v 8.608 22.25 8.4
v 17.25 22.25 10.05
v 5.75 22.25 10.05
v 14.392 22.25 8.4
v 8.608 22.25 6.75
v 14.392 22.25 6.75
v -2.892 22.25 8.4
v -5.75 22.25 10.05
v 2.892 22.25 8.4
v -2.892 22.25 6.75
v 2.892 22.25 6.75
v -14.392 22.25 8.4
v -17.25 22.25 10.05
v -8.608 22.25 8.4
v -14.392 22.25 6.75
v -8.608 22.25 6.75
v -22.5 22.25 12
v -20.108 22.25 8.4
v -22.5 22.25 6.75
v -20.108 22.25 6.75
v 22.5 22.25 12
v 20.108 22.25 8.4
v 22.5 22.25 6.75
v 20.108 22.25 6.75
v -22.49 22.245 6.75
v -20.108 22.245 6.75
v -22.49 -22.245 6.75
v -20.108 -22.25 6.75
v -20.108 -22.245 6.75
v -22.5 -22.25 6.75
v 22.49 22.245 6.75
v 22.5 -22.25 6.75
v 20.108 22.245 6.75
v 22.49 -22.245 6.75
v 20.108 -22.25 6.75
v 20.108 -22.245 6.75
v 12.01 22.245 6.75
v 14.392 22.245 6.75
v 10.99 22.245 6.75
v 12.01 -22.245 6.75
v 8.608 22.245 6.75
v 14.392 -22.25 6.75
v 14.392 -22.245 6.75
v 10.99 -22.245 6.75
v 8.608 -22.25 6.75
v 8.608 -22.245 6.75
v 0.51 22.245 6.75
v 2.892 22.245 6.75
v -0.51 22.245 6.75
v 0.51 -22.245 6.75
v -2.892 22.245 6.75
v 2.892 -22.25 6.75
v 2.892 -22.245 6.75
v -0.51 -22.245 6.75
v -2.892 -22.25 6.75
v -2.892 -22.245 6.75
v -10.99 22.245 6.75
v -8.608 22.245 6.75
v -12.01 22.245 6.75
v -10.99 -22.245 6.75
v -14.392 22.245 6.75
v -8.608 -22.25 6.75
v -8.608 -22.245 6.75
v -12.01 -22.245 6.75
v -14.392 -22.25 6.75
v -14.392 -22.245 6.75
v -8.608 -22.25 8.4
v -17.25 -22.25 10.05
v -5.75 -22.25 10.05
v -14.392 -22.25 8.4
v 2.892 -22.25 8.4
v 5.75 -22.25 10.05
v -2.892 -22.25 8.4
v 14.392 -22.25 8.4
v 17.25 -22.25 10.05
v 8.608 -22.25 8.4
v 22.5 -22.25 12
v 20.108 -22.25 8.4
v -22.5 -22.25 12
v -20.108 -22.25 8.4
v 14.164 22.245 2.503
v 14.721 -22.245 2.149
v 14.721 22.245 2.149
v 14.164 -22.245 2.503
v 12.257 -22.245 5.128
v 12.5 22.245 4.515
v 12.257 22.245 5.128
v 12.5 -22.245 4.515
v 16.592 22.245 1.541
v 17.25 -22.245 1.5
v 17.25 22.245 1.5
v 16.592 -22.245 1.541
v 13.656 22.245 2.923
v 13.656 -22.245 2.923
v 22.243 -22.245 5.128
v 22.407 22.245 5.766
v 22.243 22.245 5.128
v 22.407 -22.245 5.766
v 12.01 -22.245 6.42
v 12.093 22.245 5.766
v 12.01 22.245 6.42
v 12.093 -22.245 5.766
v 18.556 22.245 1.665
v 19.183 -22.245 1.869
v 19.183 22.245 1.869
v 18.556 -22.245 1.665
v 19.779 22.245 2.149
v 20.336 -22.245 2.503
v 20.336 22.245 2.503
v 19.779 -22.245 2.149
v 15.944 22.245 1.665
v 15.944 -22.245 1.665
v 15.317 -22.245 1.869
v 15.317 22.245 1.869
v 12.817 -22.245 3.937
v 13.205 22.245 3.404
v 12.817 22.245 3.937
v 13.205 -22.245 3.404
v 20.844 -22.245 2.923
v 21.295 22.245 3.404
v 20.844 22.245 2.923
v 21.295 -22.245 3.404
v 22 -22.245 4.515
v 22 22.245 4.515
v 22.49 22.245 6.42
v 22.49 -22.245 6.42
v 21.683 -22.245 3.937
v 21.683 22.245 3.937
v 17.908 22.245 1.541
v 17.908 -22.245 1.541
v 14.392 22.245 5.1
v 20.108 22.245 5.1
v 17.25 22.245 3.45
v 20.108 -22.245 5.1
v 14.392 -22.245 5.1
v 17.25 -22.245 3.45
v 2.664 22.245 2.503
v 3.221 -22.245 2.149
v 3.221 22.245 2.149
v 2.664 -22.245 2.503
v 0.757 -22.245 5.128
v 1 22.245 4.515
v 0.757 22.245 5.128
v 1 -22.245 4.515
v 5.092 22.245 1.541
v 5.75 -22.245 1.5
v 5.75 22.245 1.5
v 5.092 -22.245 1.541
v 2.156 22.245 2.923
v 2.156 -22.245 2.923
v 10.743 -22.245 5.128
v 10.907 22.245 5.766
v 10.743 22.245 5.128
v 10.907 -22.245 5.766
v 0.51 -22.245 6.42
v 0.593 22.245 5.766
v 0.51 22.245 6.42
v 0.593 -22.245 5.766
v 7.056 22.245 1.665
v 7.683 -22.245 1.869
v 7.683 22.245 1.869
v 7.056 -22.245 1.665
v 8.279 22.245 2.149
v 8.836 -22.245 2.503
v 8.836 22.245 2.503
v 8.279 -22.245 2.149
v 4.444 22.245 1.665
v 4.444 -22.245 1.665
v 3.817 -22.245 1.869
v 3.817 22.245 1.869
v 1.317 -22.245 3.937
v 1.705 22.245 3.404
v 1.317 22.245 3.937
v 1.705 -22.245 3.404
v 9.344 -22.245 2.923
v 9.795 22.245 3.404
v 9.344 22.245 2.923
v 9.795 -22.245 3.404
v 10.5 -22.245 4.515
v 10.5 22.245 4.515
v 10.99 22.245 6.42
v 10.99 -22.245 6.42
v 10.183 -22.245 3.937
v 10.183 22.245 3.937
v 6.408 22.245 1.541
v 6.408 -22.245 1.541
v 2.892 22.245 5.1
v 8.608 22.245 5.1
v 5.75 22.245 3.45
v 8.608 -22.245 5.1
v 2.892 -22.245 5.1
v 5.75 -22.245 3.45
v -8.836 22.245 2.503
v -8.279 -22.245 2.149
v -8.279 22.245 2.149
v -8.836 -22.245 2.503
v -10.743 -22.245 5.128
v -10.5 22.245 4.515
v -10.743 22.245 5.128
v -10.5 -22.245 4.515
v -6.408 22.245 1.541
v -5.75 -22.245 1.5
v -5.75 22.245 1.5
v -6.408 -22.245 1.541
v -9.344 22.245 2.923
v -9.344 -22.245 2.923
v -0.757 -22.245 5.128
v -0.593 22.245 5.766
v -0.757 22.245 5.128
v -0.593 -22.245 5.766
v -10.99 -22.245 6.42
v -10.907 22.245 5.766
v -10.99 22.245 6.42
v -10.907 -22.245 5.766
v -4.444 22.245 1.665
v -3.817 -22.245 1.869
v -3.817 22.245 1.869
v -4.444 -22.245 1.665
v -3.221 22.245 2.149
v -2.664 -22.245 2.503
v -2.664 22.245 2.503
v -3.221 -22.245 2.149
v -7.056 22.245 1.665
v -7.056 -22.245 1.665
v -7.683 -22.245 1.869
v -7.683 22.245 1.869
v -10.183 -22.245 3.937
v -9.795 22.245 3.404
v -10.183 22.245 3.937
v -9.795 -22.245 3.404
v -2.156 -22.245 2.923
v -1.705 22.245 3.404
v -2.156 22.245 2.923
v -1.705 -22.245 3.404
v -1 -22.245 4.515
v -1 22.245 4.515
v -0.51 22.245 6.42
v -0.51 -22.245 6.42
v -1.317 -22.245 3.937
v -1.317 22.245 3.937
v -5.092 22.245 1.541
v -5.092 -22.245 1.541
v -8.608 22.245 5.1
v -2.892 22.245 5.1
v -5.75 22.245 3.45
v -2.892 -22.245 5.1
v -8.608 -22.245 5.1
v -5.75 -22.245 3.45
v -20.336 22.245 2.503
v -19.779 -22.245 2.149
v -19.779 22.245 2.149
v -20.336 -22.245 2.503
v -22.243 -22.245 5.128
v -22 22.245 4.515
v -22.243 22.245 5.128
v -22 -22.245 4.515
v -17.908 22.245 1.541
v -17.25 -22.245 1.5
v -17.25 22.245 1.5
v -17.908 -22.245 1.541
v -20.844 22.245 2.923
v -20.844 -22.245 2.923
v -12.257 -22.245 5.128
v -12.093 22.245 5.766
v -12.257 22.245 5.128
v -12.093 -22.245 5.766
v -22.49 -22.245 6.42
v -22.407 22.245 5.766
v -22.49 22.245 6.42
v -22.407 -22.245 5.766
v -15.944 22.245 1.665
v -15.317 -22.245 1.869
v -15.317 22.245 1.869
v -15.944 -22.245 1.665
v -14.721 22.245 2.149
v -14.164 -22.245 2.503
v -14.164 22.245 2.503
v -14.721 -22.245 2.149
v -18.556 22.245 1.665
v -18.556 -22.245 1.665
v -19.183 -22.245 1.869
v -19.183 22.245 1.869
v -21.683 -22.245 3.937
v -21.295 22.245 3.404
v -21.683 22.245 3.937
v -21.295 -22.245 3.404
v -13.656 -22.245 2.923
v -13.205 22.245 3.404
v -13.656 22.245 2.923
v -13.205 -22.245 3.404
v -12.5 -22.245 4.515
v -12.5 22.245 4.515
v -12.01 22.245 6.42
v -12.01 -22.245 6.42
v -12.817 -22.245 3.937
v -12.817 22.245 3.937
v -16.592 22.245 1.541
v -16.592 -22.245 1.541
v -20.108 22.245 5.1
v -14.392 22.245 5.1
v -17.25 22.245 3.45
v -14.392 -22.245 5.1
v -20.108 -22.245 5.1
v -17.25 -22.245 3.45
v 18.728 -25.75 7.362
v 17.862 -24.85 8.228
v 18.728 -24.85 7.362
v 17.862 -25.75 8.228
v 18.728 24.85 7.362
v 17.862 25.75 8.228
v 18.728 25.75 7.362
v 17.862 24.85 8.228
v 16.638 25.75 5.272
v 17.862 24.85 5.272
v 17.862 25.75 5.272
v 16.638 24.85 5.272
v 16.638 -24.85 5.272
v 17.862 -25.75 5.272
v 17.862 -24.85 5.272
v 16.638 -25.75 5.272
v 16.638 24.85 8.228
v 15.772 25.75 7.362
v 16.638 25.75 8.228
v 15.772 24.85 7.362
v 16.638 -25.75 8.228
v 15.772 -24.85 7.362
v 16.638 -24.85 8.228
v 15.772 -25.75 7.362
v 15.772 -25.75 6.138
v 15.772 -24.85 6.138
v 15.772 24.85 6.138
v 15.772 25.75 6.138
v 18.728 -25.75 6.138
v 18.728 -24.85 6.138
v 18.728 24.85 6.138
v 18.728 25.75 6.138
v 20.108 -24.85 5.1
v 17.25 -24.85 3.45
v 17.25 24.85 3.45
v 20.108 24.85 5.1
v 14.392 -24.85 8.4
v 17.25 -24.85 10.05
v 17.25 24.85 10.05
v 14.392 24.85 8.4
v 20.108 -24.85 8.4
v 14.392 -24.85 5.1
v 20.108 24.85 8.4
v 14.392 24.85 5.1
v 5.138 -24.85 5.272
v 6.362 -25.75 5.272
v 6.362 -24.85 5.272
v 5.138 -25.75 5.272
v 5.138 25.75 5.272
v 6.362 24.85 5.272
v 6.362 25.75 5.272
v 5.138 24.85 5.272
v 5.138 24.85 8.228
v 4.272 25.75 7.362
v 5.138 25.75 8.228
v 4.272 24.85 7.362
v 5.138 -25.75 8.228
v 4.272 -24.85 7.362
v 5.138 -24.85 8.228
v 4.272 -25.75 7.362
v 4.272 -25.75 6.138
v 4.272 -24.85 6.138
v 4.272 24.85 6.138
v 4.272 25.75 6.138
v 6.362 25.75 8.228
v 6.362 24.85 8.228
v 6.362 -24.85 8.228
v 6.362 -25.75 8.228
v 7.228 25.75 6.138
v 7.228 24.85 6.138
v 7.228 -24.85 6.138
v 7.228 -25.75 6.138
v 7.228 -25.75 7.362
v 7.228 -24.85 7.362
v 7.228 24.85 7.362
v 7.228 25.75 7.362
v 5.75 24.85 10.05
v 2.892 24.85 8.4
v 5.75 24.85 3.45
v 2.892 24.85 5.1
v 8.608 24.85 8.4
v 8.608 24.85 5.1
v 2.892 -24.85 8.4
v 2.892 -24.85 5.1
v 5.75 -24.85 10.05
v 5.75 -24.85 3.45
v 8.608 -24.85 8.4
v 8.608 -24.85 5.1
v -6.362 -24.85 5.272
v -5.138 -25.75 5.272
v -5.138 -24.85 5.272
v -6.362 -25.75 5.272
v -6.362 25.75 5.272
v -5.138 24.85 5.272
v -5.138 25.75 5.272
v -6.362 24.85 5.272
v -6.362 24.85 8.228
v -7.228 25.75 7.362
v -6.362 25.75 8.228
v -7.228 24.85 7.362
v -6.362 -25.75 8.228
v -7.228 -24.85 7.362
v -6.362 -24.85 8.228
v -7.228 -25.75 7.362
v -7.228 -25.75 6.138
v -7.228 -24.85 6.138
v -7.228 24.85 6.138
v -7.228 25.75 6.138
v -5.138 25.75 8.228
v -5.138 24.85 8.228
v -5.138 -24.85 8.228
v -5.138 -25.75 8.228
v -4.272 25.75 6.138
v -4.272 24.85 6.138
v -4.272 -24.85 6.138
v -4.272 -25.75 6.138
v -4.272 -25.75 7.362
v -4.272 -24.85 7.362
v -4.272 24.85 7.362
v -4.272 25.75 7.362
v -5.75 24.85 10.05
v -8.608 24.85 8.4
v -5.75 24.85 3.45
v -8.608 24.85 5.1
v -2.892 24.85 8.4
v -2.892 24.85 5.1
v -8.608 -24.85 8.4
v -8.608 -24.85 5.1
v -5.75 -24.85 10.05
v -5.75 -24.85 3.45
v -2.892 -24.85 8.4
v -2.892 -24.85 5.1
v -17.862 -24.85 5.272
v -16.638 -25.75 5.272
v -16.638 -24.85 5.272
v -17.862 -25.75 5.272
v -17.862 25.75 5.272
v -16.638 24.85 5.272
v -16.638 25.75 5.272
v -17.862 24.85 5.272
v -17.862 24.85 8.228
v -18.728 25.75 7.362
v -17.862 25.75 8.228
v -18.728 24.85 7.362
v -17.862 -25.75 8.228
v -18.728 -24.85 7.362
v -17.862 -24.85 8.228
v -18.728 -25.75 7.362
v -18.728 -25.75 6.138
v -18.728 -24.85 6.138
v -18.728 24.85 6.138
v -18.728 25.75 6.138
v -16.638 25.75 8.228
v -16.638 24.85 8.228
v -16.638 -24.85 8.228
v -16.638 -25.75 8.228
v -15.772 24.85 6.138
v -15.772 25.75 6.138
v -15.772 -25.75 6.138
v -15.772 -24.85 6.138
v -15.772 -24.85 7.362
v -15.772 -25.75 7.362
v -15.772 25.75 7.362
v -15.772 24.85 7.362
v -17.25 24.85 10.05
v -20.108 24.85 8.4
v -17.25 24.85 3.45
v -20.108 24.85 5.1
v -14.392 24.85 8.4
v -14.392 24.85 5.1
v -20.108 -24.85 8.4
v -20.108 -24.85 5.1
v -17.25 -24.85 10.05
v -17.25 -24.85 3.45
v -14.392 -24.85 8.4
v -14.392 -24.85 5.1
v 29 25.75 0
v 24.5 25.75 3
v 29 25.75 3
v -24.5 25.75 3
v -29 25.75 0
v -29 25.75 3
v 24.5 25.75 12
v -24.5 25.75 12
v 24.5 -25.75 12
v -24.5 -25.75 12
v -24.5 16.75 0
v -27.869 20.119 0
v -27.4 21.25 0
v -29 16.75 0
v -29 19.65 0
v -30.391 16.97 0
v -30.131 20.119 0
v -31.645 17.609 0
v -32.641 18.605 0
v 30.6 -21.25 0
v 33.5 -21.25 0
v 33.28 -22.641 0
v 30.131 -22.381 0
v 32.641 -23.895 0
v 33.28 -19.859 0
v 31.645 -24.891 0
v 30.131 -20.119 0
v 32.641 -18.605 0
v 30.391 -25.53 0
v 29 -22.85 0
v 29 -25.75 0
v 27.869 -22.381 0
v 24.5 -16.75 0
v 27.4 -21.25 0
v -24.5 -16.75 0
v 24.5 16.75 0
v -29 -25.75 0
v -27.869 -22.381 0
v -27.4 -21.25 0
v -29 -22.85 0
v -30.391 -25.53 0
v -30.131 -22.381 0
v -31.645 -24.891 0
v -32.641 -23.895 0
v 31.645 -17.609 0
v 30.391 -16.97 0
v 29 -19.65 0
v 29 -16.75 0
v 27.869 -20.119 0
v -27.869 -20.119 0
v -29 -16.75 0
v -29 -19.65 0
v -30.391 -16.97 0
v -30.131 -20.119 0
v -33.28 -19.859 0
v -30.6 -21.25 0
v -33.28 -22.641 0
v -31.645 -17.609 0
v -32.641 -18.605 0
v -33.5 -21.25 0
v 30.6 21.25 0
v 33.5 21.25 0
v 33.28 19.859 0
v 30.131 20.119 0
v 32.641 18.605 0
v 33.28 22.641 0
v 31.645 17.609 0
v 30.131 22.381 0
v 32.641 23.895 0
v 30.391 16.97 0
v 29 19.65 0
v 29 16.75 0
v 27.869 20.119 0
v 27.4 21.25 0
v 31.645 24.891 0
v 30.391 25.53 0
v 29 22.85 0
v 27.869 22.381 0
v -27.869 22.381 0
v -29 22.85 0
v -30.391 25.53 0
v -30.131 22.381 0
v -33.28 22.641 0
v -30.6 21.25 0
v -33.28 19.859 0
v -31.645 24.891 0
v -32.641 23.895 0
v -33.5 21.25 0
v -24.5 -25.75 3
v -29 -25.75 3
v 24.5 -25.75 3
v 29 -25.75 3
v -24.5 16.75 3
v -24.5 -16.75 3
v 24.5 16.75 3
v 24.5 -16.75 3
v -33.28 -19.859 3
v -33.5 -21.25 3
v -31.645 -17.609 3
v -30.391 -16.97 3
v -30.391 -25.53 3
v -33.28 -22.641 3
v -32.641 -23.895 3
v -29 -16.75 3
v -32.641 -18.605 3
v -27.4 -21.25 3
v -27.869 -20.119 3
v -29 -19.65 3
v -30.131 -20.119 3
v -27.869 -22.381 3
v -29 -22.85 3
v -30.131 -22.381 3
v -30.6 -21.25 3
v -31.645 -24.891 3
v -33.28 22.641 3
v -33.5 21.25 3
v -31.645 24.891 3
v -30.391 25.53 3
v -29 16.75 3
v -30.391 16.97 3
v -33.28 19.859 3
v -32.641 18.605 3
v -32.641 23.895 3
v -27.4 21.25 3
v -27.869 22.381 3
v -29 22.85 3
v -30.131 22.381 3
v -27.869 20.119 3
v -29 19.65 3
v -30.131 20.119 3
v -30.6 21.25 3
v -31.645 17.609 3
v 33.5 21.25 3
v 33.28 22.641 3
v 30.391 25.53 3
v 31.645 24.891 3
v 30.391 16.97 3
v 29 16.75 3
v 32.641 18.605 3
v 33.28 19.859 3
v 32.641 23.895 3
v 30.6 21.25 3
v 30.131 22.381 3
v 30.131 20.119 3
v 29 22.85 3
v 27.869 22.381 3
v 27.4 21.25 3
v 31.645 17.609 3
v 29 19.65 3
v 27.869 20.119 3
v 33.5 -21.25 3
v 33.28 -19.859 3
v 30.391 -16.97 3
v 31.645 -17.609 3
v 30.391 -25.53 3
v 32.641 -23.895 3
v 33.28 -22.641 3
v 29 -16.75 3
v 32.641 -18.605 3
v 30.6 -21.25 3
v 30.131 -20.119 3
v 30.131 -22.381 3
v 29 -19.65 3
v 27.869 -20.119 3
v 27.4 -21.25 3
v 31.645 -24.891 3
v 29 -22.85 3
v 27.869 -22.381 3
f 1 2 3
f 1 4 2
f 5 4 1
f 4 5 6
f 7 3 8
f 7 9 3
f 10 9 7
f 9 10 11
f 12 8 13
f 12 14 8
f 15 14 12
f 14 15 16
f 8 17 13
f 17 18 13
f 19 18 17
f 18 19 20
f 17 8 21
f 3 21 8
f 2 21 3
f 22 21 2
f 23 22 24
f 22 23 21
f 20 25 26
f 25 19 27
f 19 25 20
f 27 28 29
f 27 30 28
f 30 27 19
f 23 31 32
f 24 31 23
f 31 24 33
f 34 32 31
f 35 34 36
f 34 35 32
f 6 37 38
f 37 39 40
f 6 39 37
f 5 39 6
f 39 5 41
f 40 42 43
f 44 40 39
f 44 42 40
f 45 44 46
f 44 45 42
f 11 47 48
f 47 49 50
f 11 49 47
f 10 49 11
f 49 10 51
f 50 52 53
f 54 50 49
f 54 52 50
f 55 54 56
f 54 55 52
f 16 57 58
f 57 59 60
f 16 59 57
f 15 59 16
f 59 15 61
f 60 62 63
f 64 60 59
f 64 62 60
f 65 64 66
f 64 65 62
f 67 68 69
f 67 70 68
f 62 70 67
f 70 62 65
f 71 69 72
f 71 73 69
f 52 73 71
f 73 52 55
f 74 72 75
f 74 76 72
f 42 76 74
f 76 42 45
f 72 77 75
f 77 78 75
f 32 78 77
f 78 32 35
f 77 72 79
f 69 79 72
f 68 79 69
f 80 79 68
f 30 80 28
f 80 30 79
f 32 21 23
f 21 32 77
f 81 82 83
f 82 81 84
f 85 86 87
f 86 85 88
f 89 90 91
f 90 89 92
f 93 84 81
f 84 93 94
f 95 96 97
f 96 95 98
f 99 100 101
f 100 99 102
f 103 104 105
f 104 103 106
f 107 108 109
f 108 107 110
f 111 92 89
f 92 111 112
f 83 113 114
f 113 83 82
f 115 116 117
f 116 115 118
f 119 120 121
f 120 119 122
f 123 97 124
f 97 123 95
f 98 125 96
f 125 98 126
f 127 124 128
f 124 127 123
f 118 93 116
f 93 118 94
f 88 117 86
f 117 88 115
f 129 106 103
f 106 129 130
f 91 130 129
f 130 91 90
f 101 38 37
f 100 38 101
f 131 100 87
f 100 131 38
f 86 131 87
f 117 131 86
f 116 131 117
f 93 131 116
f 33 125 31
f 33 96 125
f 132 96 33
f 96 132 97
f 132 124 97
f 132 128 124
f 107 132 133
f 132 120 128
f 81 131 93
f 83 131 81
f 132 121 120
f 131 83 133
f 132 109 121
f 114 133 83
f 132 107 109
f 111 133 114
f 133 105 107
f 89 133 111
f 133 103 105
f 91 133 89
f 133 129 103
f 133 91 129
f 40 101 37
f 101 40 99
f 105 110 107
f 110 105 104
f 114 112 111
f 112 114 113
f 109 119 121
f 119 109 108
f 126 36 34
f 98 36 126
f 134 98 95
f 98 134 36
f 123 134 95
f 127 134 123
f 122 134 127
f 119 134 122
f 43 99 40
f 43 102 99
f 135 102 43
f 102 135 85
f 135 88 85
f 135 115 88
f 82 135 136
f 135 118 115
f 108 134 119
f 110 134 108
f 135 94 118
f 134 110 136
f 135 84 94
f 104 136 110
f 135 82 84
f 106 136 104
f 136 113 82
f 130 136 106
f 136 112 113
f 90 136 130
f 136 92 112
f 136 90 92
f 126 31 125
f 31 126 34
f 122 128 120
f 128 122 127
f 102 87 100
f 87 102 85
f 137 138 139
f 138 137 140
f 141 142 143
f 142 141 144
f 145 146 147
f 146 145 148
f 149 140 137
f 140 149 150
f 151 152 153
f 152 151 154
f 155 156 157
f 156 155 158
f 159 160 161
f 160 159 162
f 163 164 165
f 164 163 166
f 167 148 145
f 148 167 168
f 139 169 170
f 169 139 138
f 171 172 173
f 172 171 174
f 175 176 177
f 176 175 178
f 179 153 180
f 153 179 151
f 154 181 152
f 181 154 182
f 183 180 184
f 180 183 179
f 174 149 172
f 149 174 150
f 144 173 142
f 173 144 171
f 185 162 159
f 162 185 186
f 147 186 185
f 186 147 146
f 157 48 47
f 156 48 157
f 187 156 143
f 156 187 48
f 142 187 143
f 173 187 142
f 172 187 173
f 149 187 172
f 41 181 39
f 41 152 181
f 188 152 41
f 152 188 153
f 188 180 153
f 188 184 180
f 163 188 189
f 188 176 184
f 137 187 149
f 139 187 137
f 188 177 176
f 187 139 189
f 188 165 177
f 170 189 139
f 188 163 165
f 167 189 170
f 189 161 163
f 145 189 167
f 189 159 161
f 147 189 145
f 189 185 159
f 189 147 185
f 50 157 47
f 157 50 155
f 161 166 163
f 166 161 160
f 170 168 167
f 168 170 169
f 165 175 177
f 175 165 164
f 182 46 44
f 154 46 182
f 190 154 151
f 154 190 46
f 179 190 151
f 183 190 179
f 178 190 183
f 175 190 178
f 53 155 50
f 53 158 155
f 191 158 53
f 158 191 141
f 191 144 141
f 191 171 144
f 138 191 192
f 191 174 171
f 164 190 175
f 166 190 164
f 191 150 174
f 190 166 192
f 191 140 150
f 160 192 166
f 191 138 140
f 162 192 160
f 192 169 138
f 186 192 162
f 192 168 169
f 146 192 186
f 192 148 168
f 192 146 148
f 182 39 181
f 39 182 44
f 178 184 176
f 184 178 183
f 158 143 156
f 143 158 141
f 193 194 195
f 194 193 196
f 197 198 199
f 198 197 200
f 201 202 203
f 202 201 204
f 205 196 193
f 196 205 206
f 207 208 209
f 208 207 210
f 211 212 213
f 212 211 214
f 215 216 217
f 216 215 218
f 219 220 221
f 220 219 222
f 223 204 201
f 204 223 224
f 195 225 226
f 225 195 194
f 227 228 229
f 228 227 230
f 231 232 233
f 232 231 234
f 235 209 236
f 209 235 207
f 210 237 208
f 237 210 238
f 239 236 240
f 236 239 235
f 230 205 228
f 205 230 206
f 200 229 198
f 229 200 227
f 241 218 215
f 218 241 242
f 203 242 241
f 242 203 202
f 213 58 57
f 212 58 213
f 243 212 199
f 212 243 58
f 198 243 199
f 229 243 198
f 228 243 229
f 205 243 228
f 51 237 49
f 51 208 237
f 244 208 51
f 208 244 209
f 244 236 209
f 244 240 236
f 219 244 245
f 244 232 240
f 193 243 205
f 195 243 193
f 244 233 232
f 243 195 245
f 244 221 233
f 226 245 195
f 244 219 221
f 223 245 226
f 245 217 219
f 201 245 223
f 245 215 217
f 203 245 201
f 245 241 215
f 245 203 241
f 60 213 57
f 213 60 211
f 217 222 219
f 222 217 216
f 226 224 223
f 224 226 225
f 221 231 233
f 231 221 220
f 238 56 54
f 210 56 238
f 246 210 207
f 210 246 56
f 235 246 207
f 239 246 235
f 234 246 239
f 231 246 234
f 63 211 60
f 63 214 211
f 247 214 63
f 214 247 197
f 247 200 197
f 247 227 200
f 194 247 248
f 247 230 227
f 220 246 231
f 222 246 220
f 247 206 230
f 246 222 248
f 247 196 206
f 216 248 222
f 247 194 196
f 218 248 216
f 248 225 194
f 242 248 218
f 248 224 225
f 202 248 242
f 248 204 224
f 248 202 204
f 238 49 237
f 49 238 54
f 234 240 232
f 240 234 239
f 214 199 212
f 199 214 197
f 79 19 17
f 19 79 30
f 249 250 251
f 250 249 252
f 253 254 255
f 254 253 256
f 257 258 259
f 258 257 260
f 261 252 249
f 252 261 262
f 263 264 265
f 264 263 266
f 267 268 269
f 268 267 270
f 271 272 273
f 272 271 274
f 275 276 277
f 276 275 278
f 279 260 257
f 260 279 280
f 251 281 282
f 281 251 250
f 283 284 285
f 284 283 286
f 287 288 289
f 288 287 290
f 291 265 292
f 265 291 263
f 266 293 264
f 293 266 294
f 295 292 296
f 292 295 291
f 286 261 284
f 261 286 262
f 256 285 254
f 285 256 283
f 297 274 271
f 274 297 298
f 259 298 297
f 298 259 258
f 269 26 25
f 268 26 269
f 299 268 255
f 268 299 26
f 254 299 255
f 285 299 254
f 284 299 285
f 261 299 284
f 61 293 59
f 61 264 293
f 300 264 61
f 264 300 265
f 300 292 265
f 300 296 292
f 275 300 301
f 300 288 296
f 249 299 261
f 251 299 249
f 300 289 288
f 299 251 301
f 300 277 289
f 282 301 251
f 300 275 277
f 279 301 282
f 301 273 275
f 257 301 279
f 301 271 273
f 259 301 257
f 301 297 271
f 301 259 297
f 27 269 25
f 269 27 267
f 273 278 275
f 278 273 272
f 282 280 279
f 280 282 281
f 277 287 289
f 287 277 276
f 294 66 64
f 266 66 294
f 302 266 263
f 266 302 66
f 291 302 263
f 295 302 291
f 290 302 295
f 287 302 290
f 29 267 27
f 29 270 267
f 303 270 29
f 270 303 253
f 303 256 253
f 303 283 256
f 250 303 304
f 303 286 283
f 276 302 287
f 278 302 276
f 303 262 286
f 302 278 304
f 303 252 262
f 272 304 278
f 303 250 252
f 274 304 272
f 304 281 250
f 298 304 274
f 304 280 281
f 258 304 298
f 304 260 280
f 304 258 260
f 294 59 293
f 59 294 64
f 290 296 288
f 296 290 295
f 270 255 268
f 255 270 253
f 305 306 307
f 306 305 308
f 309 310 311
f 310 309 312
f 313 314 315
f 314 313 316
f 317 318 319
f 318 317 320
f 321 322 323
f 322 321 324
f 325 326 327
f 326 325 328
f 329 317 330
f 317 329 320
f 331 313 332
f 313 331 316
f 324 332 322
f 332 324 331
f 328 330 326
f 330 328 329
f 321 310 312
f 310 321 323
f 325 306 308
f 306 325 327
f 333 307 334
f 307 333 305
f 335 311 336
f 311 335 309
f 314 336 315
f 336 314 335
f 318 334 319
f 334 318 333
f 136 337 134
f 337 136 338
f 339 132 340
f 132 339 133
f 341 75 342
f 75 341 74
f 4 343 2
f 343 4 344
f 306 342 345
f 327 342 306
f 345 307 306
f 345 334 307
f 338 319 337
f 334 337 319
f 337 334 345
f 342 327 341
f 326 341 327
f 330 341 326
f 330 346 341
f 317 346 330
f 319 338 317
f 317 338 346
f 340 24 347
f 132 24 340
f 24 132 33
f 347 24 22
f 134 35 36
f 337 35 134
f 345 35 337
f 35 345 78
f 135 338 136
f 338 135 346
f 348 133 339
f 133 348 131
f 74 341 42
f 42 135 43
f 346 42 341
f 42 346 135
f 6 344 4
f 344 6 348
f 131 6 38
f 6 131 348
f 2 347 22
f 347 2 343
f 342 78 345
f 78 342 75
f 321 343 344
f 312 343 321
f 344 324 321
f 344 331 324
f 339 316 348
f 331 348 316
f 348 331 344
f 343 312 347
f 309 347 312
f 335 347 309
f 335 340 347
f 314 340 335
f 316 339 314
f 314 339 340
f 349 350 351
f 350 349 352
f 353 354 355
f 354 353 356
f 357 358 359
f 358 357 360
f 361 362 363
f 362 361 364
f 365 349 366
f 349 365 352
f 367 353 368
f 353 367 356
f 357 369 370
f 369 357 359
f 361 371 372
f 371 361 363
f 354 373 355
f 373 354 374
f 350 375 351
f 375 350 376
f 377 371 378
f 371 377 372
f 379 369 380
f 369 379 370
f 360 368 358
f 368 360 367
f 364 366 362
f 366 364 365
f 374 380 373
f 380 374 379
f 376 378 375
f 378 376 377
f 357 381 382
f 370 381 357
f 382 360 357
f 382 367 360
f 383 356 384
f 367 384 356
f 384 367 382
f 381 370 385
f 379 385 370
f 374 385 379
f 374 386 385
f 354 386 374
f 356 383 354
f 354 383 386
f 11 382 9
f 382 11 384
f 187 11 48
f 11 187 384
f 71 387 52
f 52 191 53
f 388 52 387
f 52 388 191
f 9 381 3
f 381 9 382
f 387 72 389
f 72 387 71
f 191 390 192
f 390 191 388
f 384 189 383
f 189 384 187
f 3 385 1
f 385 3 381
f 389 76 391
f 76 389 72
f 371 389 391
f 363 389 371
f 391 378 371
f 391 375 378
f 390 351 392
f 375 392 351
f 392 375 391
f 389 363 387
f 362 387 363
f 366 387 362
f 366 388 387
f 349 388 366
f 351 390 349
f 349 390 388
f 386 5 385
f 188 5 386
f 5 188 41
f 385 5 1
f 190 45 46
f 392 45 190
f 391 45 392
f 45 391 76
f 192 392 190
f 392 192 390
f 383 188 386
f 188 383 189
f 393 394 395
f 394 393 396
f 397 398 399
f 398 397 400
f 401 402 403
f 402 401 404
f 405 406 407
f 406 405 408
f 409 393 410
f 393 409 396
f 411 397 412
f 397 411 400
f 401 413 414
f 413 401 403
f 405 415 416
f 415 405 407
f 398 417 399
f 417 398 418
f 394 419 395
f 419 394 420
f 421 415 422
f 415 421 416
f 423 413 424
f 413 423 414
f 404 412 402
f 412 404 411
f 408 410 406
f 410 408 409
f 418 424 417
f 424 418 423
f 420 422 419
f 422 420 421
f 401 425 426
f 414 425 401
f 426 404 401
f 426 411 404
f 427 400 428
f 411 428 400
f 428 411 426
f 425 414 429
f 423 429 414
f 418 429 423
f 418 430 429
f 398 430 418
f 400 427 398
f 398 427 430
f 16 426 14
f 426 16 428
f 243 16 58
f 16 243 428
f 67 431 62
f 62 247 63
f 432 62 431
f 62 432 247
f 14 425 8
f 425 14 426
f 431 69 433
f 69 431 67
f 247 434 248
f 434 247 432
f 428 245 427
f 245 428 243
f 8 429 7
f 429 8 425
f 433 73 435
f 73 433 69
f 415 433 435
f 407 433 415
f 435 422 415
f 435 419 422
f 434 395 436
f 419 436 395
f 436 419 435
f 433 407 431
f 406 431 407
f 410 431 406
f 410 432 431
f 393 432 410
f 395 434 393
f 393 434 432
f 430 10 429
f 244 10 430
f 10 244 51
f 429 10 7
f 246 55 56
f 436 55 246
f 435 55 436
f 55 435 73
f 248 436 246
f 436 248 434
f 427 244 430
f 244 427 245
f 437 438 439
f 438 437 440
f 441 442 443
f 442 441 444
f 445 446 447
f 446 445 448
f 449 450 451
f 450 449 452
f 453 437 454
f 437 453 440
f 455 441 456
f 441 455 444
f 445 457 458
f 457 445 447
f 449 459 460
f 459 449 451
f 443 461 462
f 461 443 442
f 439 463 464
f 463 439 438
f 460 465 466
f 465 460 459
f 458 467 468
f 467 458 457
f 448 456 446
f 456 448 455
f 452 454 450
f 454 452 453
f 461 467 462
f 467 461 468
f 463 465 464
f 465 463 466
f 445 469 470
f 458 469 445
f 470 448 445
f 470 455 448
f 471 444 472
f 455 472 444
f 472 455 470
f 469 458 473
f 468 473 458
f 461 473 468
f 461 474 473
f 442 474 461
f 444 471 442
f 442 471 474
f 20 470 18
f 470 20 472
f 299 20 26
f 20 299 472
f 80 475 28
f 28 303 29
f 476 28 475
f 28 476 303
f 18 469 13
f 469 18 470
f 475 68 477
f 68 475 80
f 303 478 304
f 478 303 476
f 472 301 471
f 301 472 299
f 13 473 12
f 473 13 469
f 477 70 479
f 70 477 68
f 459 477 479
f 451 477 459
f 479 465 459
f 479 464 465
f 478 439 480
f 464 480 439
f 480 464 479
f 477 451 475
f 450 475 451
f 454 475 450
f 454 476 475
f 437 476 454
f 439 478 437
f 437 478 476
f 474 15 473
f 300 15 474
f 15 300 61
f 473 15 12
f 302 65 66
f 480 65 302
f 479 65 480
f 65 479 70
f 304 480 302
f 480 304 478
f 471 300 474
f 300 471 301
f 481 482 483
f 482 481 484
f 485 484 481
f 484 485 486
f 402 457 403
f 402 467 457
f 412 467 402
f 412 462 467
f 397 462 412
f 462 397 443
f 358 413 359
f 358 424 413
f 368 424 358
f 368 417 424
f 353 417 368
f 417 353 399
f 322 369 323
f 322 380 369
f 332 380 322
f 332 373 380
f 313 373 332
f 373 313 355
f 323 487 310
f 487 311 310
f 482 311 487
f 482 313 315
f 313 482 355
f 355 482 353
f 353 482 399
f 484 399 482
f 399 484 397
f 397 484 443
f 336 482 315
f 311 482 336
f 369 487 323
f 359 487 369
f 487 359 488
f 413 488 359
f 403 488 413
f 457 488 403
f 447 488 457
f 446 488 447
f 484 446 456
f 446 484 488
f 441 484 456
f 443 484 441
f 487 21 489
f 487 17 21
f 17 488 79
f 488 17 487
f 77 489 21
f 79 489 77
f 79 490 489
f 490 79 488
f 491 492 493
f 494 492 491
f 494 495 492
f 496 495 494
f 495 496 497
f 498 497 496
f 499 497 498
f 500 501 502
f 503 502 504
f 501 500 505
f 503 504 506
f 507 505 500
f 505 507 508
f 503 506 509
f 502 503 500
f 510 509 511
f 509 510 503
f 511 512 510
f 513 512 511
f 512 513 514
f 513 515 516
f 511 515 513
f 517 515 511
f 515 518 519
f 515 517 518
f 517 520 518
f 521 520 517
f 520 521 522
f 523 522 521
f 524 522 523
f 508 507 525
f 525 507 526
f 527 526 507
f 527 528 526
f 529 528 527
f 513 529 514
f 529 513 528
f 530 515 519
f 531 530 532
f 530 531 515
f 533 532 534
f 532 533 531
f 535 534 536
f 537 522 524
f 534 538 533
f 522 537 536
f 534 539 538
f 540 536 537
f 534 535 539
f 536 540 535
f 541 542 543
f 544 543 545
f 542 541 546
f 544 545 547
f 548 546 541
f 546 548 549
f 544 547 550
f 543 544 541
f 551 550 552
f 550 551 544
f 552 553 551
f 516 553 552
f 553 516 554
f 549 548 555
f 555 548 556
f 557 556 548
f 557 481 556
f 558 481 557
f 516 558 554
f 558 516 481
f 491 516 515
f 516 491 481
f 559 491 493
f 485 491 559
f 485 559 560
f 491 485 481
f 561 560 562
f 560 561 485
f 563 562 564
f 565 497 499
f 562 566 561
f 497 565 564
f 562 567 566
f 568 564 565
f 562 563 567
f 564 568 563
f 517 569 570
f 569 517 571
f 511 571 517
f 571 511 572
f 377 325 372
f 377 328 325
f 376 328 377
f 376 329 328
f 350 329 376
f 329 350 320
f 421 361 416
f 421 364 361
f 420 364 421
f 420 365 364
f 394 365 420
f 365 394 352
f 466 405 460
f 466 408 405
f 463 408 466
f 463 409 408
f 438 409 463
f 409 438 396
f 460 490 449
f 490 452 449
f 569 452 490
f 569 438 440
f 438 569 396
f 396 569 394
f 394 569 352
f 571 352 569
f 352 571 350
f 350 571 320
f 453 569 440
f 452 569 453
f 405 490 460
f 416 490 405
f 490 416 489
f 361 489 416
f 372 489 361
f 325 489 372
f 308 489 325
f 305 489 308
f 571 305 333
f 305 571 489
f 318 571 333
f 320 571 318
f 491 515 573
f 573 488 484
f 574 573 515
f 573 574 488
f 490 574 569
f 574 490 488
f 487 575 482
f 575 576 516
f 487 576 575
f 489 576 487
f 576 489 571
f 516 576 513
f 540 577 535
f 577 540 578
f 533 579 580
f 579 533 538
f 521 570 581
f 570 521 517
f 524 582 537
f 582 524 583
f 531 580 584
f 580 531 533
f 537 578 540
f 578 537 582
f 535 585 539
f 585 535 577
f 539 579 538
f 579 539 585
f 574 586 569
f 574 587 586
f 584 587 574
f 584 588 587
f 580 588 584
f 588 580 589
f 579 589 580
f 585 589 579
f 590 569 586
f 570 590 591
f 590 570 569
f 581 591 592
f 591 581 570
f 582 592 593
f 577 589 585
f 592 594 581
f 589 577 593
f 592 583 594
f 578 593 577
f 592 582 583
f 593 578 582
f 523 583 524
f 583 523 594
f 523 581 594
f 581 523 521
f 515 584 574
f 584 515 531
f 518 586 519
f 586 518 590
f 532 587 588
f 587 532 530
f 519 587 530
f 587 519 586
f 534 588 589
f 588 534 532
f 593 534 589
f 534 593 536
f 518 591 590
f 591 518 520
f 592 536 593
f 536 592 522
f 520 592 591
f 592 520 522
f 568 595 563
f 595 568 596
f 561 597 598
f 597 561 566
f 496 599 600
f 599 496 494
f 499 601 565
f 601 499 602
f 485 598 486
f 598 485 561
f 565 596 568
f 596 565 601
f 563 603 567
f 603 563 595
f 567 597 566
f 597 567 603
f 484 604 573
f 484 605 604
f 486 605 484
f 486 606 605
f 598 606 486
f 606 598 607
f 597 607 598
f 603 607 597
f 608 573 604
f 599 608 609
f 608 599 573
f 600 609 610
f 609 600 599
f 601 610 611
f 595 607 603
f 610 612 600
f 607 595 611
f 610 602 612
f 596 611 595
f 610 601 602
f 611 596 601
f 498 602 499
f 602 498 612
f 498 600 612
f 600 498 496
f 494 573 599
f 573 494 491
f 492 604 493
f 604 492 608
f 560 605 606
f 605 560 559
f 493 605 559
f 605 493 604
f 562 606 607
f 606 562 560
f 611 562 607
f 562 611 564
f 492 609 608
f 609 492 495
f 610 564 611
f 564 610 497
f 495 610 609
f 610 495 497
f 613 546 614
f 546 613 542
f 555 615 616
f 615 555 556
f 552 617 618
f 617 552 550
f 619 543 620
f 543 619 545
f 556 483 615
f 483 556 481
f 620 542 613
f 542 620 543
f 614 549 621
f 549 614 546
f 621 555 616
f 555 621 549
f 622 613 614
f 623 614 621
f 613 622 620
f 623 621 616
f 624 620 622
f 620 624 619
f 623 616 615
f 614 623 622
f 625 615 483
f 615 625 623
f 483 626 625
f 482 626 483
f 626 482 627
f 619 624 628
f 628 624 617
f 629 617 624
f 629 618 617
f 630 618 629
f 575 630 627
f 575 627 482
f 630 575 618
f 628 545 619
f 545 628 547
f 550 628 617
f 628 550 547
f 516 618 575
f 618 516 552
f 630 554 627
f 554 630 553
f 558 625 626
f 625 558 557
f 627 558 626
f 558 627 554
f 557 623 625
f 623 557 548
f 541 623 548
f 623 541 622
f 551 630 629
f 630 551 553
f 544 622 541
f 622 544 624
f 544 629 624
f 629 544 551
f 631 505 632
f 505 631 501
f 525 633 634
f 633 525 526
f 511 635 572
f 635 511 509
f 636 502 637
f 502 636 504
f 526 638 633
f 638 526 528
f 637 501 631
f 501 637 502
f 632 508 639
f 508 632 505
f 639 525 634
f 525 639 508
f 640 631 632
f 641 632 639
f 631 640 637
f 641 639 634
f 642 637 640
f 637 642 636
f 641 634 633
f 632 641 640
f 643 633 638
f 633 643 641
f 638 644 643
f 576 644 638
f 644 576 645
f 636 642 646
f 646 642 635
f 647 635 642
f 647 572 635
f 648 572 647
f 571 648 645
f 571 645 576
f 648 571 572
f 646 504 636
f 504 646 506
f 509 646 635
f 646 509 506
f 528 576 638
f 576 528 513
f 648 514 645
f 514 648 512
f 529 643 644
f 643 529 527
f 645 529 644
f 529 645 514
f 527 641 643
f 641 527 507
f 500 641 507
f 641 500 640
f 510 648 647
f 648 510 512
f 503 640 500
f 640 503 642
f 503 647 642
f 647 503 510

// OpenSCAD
// file: functions.scad
// PRUSA Mendel  
// Functions used in many files
// GNU GPL v3
// Josef Průša
// josefprusa@me.com
// prusadjs.cz
// http://www.reprap.org/wiki/Prusa_Mendel
// http://github.com/prusajr/PrusaMendel


module nut(d,h,horizontal=true)
{
  cornerdiameter =  (d / 2) / cos (180 / 6);
  cylinder(h = h, r = cornerdiameter, $fn = 6);
  if(horizontal) {
    for(i = [1:6]) {
      rotate([0,0,60*i]) 
        translate([-cornerdiameter-0.2,0,0])
          rotate([0,0,-45])
            cube(size = [2,2,h]);
     }
  }
}

// Based on nophead research
module polyhole(d,h) 
{
    n = max(round(2 * d),3);
    rotate([0,0,180])
        cylinder(h = h, r = (d / 2) / cos (180 / n), $fn = n);
}

module teardrop(r,h)
{
  $fa=15.0;
  $fs=0.1;

  diameter=2*r;

  linear_extrude(height=h, center=false, convexity=10)
  difference() {
    union() {
      circle(r=diameter/2);
      rotate(45) square(size=diameter/2,center=false);
    }
    translate([-diameter/2,diameter/2]) square(size=diameter);
  }
}

module roundcorner(diameter)
{
  difference() {
    cube(size = [diameter,diameter,99], center = false);
    translate(v = [diameter, diameter, 0]) 
      cylinder(h = 100, r=diameter, center=true);
  }
}
// file: Parameterized_battery_holder.scad
/***************************************************************
 Parameterized Battery pack with electrical connections
  (c) 2010 Juan Gonzalez-Gomez (Obijuan) juan@iearobotics.com
   This design is derived from the Battery comparment generator
   (c) Nikolaus Gradwohl (guru (at) local-guru.net)
    http://www.thingiverse.com/thing:5051
Other contributors:
  * Chris Thompson (http://eagleapex.com/): Connection in series along the case
 -----------------------------------------------------------
 The nuts (two per battery) are embedded into the battery pack. 
 The screws (two per battery) are inserted from the outside and
 touch the batteries.
-----------------------------------------------------------
GPL LICENCE
****************************************************************/
include <configuration.scad>
use <functions.scad>

/***************************************************/
/* Battery holder. Parameters                      */
/* -size: battery size. It can be:                 */
/*    0 for AA, 1 for AAA, 2 for C and 3 for D     */
/* -num: Number of batteries                       */
/***************************************************/
module battery_holder(size=0, num=4)
{
   //-- Battery sizes
  batteries = [
    [ 10.5,44.5 ],  //-- AAA
    [14.5, 50.5],   //-- AA size
    [ 26.2, 50 ],   //-- C
    [ 34.2, 61.5 ], //-- D
  ];

  //--default value
  typ=batteries[size];

  //---------------------------------
  //-- Battery pack parameters
  //-- Can be set by the user
  //---------------------------------

  //-- Battery pack thickness
  bottom_thick=1.5;
  fr_thick=3.5;    //-- Front and rear parts
  side_thick=2;    //-- Side part

  //-- Distance beween batteries
  distance_bat=1;

  //-- Battery dimensions: width, height and length. Change ser for batteries in series along the case.  

  ser=1;
  w=typ[0];
  h=w;
  l=typ[1]*ser;

  //-- Dimensions of the inner part of the compartiment
  ip_l = l;
  ip_w = w + (w+distance_bat)*(num-1);
  ip_h = h;

  //-- Dimensions of the mother cube
  mc_l = ip_l+2*fr_thick;
  mc_w = ip_w+2*side_thick;
  mc_h = ip_h+bottom_thick;

  //-- The process of building the battery pack is just substracting
  //-- things to the mother cube
  translate([0,0,bottom_thick/2])
  rotate([0,0,90])
  difference() {
    //-- The mother cube
     translate([0,0,-bottom_thick/2])
      cube(size=[mc_l, mc_w, mc_h],center=true);

    //-- Array of batteries
    translate([0,0,h/2])
    cube(size=[ip_l,ip_w,ip_h],center=true);

    translate([0,-mc_w/2+w/2+side_thick,0])
    for ( i = [0:num-1] ) {

      translate([0,i*(w+distance_bat),0])
      union() {
        translate([0,0,h/2])
           cube(size=[l,w,h],center=true);

        rotate([0,90,0])
          cylinder(r=w/2, h=l-0.01, center=true, $fn=50); 
      }
    }

    //-- Array of contacts
    translate([0,-mc_w/2+w/2+side_thick,0])
    for ( i = [0:num-1] ) {
      //-- Drills
      translate([0,i*(w+distance_bat),0])
      rotate([0,90,0])
      rotate([0,0,45/2])
      cylinder(center=true,h=l+20, r=drill_M3/2, $fn=8);

      //-- Room for the embedded nuts
      translate([0,i*(w+distance_bat),0])
      rotate([0,90,0]) 
      cylinder(h=l+2*nut_h, r=nut_radius, $fn=6, center=true);
    }
  
  }
}

//-- Default battery holder
battery_holder();
// file: configuration.scad
//------------------------------------
//-- Miniskybot 2 configuration file
//------------------------------------


//-- drills
drill_M3 = 3.2;

//-- captive Nuts
nut_h = 2.6;
nut_radius = 6.6/2;

//-------------------------------------------
//-- Battery holder parameters
//-- See the doc/battery_holder.dxf file
//-------------------------------------------
battery_c1 = 49;
battery_c2 = 51.5;
battery_c3 = 12;
battery_ear_diam = 9;
battery_ear_h = 3;
battery_top_gap = 1;  
//-- Real battery height whith batteries inserted
battery_height = battery_c3 + battery_top_gap;

//------------------------------------------------
//-- Servo parameters
//-- See the doc/futaba-doc2.dxf file
//------------------------------------------------
//-- Servo futaba 3003 dimensions
servo_c1 = 20;
servo_c2 = 7.5;
servo_c3 = 26.4;
servo_c4 = 40.3;
servo_c5 = 30.3;
servo_c6 = 10;
servo_c7 = 11.6;
servo_c8 = 4.1;
servo_c9 = 5.2;
servo_c10 = 9.6;
// main file
//---------------------------------------------------------
//-- Battery holder for Miniskybot 2. It is based on
//-- the parameterized batery_holder of Miniskybot 1, but
//-- with 4 "ears" for screwing to the chassis
//---------------------------------------------------------
include <configuration.scad>
use <Parameterized_battery_holder.scad>

//-------------------------------
//-- Battery holder ears
//-- Parameters:
//--   do: outer diameter
//--   h : ear height
//-------------------------------
module ear(do, h)
{
  translate([-do/2,do/2,0])
  difference() {
    union() {
      cylinder(r=do/2, h=h,$fn=20);

      translate([do/4,0,h/2])
      cube([do/2,do,h],center=true);
    }
    cylinder(r=drill_M3/2, h=h+10,$fn=8,center=true);
  }
}

//-------------------------------
//--- Battery holder
//-------------------------------
module battery()
{
  union() {

    //-- Main part: a battery holder for 4 AAA batteries
    battery_holder(size=0,num=4);

    //-- Add the 4 ears
    translate([-battery_c1/2,-battery_c2/2,-battery_c3/2])
      ear(do=battery_ear_diam, h=battery_ear_h);

    translate([-battery_c1/2, battery_c2/2-battery_ear_diam,-battery_c3/2])
      ear(do=battery_ear_diam, h=battery_ear_h);

    translate([battery_c1/2, battery_c2/2-battery_ear_diam,-battery_c3/2])
    mirror([1,0,0])
    ear(do=battery_ear_diam,  h=battery_ear_h);

    translate([battery_c1/2, -battery_c2/2,-battery_c3/2])
    mirror([1,0,0])
    ear(do=battery_ear_diam,  h=battery_ear_h);
  }
}

//-- This is for testing/printing the battery holder
translate([0,0,battery_c3/2])
battery();
